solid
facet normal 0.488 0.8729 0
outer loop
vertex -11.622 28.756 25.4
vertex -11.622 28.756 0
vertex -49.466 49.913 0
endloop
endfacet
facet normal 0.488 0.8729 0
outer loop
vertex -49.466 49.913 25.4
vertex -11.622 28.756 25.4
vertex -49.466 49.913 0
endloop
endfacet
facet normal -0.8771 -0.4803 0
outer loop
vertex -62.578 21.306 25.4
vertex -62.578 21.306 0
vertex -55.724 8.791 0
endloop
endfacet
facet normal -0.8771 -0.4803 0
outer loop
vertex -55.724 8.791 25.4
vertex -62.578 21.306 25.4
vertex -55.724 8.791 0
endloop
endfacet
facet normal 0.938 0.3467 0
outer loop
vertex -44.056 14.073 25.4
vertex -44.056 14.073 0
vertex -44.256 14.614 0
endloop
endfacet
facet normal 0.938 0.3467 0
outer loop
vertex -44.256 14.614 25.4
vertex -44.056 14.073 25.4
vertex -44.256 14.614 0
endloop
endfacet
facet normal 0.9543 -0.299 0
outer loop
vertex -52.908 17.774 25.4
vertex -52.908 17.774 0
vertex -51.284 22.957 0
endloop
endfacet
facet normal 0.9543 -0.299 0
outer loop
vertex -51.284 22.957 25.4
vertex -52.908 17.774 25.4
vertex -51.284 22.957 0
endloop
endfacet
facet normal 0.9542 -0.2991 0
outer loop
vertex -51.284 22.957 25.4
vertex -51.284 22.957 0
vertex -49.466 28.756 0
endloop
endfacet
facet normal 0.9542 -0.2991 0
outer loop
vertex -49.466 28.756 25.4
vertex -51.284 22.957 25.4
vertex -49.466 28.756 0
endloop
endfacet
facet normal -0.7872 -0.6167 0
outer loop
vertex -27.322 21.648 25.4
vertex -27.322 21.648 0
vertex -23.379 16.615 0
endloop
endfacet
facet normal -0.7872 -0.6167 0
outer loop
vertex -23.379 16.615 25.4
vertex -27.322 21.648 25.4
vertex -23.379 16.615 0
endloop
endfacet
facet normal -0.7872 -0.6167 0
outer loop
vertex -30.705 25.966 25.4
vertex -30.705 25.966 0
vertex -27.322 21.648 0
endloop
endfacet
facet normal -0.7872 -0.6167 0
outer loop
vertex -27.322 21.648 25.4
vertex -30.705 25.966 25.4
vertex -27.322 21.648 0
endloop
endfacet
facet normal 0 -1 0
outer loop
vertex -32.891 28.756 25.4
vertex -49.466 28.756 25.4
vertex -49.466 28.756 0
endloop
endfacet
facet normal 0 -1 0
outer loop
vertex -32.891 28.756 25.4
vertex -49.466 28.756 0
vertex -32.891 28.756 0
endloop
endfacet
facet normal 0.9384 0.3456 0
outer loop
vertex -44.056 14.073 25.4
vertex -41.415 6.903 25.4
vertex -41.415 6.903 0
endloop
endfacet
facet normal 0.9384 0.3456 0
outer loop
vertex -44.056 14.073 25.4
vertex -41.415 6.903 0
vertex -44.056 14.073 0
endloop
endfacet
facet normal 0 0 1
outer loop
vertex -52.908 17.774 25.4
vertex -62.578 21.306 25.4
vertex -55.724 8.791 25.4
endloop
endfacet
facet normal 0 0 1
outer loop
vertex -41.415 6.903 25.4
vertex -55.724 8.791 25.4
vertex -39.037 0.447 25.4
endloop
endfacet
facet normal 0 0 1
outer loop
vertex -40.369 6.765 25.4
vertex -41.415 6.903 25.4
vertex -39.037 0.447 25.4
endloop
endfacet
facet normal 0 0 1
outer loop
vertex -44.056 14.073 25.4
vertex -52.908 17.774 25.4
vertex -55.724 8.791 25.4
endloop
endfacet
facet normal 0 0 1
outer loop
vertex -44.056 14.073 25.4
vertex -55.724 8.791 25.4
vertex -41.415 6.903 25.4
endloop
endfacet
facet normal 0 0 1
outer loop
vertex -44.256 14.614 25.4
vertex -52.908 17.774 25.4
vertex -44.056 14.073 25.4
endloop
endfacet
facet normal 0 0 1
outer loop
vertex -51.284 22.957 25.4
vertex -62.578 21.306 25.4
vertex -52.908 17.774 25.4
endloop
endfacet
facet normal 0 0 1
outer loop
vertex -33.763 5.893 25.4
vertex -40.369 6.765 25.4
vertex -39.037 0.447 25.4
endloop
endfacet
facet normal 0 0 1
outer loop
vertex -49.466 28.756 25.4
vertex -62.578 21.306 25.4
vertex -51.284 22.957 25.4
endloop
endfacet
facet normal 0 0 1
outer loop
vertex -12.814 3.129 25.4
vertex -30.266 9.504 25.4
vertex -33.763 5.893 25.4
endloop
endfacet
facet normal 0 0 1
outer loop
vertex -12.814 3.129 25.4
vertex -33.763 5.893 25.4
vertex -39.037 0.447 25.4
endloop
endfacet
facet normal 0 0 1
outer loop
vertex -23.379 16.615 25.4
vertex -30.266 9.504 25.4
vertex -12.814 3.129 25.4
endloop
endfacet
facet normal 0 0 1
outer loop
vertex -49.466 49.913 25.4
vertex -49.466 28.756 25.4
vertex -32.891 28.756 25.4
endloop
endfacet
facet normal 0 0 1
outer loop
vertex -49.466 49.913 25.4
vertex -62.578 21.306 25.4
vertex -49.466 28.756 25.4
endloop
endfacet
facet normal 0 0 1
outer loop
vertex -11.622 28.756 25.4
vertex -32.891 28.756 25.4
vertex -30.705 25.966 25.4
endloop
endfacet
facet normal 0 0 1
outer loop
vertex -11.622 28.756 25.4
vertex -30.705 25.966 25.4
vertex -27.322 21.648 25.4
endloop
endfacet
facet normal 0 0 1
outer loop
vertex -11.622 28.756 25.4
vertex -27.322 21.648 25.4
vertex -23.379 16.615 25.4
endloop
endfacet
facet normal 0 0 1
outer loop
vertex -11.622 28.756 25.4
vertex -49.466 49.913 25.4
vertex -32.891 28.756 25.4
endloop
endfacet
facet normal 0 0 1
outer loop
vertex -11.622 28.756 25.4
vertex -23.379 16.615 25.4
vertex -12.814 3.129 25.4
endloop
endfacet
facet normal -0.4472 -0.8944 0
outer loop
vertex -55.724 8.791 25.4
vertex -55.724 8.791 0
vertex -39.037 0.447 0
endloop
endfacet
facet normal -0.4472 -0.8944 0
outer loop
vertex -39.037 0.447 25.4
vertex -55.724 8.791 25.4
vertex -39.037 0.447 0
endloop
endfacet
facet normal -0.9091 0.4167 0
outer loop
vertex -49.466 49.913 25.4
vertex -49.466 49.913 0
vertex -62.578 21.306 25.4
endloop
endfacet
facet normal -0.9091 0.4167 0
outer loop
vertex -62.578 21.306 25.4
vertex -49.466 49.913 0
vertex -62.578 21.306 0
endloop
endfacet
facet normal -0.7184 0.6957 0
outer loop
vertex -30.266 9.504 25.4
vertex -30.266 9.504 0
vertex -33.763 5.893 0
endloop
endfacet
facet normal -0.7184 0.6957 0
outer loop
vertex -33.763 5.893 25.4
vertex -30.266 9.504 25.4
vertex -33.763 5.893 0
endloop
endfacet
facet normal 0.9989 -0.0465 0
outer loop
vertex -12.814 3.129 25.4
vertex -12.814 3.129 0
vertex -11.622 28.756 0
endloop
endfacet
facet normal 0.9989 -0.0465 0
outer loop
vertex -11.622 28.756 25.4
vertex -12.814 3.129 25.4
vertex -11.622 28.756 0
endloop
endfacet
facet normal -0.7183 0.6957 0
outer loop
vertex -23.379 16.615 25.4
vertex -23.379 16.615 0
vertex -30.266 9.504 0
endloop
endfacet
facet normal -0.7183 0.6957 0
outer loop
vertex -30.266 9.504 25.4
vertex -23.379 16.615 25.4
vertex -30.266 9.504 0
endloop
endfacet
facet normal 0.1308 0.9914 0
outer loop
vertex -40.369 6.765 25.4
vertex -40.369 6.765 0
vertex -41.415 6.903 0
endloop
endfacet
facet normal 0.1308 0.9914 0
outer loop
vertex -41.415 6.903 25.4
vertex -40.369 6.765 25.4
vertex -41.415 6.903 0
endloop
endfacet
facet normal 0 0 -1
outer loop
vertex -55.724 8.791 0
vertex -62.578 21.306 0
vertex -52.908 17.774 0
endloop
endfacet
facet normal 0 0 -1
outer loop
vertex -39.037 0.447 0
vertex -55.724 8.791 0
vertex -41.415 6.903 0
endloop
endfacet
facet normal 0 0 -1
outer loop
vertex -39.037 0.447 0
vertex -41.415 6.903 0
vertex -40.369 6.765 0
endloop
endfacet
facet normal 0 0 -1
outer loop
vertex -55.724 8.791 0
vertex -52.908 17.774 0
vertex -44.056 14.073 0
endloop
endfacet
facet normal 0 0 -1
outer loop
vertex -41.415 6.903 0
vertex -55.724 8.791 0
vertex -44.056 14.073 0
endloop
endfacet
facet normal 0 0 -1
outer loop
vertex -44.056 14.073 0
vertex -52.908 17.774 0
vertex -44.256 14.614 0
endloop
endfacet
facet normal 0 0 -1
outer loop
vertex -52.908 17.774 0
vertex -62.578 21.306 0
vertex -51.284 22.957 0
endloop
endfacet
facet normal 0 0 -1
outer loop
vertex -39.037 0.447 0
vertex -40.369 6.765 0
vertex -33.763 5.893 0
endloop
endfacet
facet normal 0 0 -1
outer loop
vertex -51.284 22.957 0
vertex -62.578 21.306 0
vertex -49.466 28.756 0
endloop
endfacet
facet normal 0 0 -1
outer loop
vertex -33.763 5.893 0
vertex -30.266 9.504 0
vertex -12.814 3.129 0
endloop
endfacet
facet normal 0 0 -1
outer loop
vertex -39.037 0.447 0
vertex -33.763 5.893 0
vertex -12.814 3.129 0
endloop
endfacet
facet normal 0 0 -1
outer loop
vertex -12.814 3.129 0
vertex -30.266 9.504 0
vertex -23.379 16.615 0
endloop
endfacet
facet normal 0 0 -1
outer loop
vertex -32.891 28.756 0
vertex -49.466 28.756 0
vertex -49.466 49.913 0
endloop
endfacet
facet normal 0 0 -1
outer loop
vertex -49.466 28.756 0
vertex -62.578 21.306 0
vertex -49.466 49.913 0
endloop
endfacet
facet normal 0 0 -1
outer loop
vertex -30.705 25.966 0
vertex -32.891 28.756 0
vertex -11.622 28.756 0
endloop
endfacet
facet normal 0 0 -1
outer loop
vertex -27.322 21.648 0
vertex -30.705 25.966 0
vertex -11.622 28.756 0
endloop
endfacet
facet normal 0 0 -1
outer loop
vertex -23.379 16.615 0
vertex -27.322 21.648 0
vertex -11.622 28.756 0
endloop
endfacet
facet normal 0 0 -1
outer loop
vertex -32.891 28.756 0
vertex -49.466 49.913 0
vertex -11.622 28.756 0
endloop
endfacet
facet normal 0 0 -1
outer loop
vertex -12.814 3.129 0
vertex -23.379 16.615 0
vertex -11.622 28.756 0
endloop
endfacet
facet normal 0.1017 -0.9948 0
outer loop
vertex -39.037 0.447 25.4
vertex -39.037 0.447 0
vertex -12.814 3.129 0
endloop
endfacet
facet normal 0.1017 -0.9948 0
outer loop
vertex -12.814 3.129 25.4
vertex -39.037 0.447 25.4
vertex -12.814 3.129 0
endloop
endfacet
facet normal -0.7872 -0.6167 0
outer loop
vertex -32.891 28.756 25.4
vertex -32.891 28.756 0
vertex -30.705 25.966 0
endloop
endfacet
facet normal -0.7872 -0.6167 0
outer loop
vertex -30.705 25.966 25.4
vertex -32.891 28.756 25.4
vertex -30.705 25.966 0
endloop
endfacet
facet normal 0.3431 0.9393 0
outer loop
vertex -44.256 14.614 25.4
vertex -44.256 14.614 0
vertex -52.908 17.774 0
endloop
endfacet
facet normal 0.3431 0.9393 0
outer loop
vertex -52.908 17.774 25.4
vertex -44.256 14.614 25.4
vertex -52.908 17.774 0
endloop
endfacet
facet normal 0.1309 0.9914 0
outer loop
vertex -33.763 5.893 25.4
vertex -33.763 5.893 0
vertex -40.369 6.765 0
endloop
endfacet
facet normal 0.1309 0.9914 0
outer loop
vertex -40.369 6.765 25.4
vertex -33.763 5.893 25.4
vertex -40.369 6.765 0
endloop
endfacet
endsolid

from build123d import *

# Parameters (mm, degrees)
F1_DEPTH = 25.4


with BuildPart() as f1:
    # F0 (on Top) → F1 (new body)
    with BuildSketch(Plane.XY):
        Polygon((-49.4661442935, 49.9131269753), (-49.4661442935, 28.7559218705), (-45.0052889839, 28.7559218705), align=None)
        Polygon((-62.5776574016, 21.3062018156), (-49.4661442935, 28.7559218705), (-49.4661442935, 49.9131269753), align=None)
        Polygon((-51.2835987262, 22.9573797383), (-49.4661442935, 28.7559218705), (-62.5776574016, 21.3062018156), align=None)
        Polygon((-49.4661442935, 49.9131269753), (-45.0052889839, 28.7559218705), (-32.8907538248, 28.7559218705), align=None)
        Polygon((-52.9081679909, 17.7742328277), (-51.2835987262, 22.9573797383), (-62.5776574016, 21.3062018156), align=None)
        Polygon((-11.6215646267, 28.7559218705), (-49.4661442935, 49.9131269753), (-32.8907538248, 28.7559218705), align=None)
        Polygon((-52.9081679909, 17.7742328277), (-62.5776574016, 21.3062018156), (-55.7239130139, 8.7906699628), align=None)
        Polygon((-11.6215646267, 28.7559218705), (-32.8907538248, 28.7559218705), (-30.7049791526, 25.9659494027), align=None)
        Polygon((-44.056481693, 14.0725475488), (-44.2558990488, 14.6138233913), (-52.9081679909, 17.7742328277), (-55.7239130139, 8.7906699628), align=None)
        Polygon((-23.3790820657, 16.6150078645), (-11.6215646267, 28.7559218705), (-27.3222628842, 21.6481734783), align=None)
        Polygon((-12.8135187551, 3.1288827304), (-11.6215646267, 28.7559218705), (-23.3790820657, 16.6150078645), align=None)
        Polygon((-27.3222628842, 21.6481734783), (-11.6215646267, 28.7559218705), (-30.7049791526, 25.9659494027), align=None)
        Polygon((-41.4149532636, 6.9026825177), (-55.7239130139, 8.7906699628), (-39.0365384519, 0.4469832347), align=None)
        Polygon((-44.056481693, 14.0725475488), (-55.7239130139, 8.7906699628), (-41.4149532636, 6.9026825177), align=None)
        Polygon((-30.2658398726, 9.5036823021), (-12.8135187551, 3.1288827304), (-26.9007566578, 12.9784962793), align=None)
        Polygon((-39.0365384519, 0.4469832347), (-12.8135187551, 3.1288827304), (-33.7625144996, 5.8929858967), align=None)
        Polygon((-26.9007566578, 12.9784962793), (-12.8135187551, 3.1288827304), (-23.3790820657, 16.6150078645), align=None)
        Polygon((-33.7625144996, 5.8929858967), (-12.8135187551, 3.1288827304), (-30.2658398726, 9.5036823021), align=None)
        Polygon((-40.3685695275, 6.7646180189), (-39.0365384519, 0.4469832347), (-33.7625144996, 5.8929858967), align=None)
        Polygon((-41.4149532636, 6.9026825177), (-39.0365384519, 0.4469832347), (-40.3685695275, 6.7646180189), align=None)
    extrude(amount=F1_DEPTH)


solid = f1.part
